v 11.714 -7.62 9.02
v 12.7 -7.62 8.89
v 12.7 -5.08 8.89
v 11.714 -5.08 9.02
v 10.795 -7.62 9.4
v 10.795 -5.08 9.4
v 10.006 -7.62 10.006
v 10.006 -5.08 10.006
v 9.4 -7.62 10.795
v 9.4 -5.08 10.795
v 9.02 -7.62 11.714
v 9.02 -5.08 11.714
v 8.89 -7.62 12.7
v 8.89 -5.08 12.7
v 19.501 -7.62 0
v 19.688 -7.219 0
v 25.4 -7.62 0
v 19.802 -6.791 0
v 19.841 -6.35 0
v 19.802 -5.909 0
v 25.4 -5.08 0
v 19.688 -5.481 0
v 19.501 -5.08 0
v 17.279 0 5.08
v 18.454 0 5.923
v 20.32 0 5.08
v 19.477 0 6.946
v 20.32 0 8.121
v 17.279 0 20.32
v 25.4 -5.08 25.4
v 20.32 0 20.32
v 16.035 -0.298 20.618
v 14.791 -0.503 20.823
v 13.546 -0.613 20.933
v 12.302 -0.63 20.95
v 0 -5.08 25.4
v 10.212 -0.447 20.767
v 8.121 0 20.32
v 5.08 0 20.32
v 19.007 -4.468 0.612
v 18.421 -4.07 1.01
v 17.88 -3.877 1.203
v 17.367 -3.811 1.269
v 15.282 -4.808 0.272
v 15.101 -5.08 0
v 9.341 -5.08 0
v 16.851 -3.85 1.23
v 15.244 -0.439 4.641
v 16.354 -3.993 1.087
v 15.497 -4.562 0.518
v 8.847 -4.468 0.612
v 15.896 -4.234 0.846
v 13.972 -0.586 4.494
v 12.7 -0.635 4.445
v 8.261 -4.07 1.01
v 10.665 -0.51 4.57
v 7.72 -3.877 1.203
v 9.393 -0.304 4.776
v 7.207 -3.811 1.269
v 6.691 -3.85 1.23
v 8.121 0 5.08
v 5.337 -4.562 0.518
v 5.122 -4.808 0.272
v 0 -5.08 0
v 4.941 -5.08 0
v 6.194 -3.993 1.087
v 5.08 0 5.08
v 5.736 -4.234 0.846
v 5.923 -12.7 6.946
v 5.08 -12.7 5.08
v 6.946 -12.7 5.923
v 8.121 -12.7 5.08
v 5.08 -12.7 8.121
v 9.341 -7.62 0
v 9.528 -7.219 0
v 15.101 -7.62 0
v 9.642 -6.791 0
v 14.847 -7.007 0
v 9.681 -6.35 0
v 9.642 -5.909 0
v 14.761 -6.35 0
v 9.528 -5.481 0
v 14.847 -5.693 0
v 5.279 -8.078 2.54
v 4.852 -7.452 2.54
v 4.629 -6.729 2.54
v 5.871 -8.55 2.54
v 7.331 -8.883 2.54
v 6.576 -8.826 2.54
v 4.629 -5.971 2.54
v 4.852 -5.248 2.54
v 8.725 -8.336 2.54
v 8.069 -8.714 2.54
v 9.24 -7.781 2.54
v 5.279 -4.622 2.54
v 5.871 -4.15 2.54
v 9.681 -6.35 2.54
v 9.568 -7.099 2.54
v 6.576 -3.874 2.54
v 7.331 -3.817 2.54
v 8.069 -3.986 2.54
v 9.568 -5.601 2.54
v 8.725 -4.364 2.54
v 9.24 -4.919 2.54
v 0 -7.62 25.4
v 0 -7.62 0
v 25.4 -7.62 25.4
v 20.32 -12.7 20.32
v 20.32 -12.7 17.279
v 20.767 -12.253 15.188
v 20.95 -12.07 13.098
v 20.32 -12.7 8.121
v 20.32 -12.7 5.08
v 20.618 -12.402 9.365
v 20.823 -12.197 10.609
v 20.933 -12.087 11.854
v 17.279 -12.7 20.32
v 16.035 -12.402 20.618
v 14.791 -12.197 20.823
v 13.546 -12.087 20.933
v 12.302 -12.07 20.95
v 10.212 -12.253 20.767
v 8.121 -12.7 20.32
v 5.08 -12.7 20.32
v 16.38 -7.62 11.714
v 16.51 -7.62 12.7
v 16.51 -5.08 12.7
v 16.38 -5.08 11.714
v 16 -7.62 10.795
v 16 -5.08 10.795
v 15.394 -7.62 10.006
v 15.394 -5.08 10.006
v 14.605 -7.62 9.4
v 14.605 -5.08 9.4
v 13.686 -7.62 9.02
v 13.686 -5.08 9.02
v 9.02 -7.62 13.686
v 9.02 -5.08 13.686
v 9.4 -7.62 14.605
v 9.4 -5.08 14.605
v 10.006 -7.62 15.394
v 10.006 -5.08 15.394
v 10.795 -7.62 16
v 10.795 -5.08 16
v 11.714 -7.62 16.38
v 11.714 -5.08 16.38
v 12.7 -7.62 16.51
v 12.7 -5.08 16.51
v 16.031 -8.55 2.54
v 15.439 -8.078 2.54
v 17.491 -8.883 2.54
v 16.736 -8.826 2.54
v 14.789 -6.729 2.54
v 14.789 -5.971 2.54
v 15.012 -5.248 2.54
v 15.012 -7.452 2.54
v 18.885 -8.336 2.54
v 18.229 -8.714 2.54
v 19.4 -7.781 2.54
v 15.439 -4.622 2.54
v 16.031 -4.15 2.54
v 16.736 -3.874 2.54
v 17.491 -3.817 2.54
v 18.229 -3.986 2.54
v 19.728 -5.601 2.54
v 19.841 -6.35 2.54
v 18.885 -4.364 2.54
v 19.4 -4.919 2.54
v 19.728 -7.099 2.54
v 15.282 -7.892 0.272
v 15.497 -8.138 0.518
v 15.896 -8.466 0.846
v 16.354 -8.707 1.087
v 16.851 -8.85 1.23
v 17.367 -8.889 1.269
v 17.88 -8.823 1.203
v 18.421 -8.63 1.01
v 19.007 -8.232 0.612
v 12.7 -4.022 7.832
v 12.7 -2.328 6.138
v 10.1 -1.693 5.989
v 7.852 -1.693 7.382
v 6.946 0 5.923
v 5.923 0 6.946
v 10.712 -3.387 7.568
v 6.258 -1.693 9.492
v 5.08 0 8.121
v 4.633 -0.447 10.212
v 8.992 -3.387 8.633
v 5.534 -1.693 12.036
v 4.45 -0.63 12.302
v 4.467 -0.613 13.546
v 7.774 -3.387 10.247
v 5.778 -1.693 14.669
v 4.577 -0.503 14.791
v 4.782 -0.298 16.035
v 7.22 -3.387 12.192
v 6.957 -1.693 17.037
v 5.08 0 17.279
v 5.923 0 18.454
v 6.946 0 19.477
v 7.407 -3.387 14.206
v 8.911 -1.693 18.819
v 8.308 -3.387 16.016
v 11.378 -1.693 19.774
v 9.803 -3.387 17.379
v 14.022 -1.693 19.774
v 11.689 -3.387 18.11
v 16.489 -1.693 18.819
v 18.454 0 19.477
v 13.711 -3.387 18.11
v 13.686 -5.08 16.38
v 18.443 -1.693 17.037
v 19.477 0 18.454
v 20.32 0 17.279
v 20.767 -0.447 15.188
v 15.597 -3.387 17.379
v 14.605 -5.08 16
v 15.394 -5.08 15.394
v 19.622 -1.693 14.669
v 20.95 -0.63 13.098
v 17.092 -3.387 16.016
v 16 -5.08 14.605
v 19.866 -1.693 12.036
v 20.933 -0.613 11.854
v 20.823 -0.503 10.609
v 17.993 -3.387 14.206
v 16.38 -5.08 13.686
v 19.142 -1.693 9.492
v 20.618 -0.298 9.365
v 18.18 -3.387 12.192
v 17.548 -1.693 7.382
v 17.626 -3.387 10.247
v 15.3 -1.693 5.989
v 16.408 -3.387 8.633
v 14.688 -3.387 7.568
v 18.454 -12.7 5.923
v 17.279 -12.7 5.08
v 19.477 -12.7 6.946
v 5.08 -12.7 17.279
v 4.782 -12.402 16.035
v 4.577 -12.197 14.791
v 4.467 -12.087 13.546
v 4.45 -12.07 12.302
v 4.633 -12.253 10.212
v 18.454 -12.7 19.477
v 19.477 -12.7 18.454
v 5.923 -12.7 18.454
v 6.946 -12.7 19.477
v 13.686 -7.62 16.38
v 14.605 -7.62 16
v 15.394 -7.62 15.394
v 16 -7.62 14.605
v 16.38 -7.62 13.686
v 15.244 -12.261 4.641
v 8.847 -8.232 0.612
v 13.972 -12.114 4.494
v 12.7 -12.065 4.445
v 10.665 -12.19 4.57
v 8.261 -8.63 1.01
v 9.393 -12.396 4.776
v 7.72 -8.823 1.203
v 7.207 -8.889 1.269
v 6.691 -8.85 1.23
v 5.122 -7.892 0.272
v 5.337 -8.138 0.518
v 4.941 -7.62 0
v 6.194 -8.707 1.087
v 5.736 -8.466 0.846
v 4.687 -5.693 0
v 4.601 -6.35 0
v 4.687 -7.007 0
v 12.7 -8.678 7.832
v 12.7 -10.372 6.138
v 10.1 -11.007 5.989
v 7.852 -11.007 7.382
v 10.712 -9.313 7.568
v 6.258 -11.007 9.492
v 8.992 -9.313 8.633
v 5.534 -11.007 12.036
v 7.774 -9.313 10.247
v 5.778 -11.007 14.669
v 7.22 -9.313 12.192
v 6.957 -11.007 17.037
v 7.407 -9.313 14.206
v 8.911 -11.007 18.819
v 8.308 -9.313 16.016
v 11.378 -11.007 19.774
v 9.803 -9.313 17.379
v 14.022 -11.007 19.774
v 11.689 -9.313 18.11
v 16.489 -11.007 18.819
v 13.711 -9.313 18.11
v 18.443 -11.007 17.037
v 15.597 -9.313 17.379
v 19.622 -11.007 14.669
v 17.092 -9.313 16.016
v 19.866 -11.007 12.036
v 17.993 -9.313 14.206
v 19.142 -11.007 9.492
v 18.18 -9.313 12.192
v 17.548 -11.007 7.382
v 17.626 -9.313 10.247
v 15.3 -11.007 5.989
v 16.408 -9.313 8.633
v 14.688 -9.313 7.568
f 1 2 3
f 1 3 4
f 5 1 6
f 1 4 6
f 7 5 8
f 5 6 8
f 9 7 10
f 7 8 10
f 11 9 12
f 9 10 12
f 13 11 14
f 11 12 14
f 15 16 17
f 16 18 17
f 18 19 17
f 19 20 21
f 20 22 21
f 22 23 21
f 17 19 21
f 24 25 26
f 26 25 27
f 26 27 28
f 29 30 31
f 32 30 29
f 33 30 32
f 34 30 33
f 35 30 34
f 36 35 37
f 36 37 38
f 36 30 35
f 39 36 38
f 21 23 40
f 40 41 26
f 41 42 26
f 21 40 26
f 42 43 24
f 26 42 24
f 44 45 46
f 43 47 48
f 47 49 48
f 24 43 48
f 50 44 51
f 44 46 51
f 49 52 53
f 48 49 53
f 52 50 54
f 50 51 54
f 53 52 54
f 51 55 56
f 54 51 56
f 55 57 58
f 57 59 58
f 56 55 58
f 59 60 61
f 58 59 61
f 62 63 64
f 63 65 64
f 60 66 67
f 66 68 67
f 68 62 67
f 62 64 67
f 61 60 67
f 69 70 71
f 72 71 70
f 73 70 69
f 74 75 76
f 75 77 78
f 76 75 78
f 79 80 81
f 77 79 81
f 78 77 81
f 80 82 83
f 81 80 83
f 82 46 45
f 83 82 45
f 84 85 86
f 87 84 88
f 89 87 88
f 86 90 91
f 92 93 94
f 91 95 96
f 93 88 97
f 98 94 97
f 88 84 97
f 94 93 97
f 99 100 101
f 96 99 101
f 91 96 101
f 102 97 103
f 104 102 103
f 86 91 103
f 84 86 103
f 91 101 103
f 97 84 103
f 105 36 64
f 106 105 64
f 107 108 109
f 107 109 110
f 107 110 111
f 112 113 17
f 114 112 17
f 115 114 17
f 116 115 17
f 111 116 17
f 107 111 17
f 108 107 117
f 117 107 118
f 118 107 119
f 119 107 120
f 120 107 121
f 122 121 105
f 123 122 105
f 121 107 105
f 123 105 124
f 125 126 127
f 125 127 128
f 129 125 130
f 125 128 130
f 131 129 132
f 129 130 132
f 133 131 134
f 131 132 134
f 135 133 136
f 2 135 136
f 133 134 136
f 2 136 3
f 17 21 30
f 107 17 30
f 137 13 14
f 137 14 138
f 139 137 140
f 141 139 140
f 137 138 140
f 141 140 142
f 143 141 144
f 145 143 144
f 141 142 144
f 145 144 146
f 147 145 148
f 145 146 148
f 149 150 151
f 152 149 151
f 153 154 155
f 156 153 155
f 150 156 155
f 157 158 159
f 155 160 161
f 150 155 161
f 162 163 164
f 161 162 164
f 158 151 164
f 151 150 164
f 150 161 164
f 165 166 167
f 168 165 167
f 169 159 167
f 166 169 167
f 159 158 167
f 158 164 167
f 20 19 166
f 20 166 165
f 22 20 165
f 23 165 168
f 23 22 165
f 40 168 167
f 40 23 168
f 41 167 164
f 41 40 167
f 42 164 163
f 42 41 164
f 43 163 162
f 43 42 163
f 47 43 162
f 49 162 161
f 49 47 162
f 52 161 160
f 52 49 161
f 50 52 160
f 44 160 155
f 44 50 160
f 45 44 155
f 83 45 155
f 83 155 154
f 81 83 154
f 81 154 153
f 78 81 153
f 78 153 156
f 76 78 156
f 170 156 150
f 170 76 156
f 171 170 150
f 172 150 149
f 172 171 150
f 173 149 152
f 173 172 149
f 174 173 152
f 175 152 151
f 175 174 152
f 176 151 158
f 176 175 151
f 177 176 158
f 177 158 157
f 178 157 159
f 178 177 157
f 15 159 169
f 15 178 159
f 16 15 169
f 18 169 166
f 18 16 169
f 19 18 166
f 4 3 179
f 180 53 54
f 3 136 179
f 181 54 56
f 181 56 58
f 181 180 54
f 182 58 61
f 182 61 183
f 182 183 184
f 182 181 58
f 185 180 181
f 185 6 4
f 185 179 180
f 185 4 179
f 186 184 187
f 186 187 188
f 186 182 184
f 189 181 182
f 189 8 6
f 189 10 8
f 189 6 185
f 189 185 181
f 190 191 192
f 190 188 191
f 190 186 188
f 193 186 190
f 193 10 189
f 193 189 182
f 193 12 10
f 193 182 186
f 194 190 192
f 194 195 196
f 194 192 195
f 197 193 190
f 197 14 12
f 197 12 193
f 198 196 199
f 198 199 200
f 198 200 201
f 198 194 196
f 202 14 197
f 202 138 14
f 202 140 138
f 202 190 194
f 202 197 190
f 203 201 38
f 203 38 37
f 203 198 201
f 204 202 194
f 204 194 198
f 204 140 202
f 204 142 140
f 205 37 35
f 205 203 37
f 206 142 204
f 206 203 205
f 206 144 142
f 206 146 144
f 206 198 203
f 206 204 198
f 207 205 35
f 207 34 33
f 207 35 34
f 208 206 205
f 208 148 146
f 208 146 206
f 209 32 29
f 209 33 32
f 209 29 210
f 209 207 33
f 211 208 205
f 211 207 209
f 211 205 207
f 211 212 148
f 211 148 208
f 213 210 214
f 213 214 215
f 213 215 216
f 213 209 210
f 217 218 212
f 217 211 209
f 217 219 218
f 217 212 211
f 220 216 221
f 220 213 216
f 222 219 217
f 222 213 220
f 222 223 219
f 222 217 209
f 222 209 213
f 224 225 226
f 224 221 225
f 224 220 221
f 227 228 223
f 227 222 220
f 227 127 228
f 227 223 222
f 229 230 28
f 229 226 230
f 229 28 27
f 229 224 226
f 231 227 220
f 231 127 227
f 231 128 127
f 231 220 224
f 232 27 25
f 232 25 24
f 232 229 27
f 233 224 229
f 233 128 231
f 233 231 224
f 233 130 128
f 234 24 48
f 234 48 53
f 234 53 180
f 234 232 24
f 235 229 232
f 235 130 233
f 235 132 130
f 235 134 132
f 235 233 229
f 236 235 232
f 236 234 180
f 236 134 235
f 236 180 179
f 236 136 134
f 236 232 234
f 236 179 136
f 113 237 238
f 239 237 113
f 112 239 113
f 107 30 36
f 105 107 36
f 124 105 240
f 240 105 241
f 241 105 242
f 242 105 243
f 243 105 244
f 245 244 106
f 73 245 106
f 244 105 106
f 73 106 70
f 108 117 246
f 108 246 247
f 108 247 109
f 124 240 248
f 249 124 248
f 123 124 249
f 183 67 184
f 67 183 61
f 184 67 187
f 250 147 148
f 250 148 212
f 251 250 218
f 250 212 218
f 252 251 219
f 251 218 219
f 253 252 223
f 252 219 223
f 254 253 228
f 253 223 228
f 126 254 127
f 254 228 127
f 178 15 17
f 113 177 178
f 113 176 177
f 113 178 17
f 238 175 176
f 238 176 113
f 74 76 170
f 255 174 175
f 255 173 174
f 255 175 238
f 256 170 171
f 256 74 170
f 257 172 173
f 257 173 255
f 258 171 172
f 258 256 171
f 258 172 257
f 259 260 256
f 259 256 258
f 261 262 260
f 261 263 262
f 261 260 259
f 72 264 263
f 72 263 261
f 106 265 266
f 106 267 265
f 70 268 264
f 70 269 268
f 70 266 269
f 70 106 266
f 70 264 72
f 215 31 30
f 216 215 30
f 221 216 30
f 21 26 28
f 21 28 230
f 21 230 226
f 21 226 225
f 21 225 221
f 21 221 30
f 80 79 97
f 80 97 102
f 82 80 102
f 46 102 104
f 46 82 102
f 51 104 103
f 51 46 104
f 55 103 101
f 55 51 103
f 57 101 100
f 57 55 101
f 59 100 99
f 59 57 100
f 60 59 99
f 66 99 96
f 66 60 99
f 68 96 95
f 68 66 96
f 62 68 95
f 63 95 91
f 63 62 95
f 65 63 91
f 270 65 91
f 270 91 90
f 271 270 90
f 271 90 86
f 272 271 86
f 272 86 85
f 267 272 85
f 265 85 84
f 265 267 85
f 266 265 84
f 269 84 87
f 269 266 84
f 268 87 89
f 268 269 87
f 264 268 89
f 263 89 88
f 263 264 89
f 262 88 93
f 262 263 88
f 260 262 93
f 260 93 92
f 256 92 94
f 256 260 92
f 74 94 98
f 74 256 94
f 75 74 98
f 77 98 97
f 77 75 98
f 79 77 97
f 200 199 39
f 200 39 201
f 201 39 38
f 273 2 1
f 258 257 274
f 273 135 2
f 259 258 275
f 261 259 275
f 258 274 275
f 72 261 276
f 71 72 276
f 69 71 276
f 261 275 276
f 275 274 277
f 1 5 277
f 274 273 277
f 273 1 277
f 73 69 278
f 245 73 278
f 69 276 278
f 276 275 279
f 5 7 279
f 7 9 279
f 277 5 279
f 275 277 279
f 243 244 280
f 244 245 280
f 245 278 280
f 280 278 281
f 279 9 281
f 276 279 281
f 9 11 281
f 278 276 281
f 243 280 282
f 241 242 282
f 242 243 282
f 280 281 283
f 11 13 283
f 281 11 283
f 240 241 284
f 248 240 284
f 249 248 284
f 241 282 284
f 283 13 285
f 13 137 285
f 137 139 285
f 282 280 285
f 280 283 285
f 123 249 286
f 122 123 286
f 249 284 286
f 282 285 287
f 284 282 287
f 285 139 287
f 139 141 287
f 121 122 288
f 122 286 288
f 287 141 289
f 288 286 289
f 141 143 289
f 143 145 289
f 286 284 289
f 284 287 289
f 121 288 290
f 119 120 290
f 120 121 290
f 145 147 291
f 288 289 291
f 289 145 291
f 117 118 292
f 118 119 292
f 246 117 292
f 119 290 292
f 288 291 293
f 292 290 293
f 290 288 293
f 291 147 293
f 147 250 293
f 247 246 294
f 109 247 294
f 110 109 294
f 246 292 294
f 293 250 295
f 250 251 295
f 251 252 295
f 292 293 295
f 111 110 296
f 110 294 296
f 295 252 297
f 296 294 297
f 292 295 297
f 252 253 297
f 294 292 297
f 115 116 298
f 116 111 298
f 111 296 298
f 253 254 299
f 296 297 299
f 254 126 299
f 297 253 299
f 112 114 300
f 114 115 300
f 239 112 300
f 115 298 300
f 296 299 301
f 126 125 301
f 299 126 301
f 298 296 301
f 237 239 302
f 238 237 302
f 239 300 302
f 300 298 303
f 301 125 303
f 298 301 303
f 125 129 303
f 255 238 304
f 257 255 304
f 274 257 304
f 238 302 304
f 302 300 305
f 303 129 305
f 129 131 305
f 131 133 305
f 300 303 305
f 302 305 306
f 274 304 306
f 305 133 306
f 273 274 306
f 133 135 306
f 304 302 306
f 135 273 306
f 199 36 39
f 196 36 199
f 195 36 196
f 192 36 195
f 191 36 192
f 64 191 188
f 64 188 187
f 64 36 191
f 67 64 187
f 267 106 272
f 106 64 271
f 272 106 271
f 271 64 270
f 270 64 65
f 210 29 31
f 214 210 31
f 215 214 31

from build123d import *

# Parameters (mm, degrees)
F1_DEPTH    = 12.7
F2_R        = 2.54
F3_DEPTH    = 2.54
F4_T1_DEPTH = 51.5282991577
F4_T3_DEPTH = 51.5282991577


# Not quite as in the source:
# - a fillet or chamfer that OpenCascade refuses, or shapes differently, is made with other operations: its cross-section is extruded or revolved along the edge and cut away or added


with BuildPart() as f1:
    # F0 (on Front) → F1 (new body)
    with BuildSketch(Plane.XZ):
        with BuildLine():
            Line((0, 25.4), (0, 12.7))
            Line((0, 12.7), (8.89, 12.7))
            ThreePointArc((8.89, 12.7), (10.0059231637, 15.3940768363), (12.7, 16.51))
            Line((12.7, 16.51), (12.7, 25.4))
            Line((12.7, 25.4), (0, 25.4))
        make_face()
        with BuildLine():
            Line((16.51, 12.7), (25.4, 12.7))
            Line((25.4, 12.7), (25.4, 25.4))
            Line((25.4, 25.4), (12.7, 25.4))
            Line((12.7, 25.4), (12.7, 16.51))
            ThreePointArc((12.7, 16.51), (15.3940768363, 15.3940768363), (16.51, 12.7))
        make_face()
        with BuildLine():
            Line((12.7, 8.89), (12.7, 0))
            Line((12.7, 0), (25.4, 0))
            Line((25.4, 0), (25.4, 12.7))
            Line((25.4, 12.7), (16.51, 12.7))
            ThreePointArc((16.51, 12.7), (15.3940768363, 10.0059231637), (12.7, 8.89))
        make_face()
        with BuildLine():
            Line((0, 12.7), (0, 0))
            Line((0, 0), (12.7, 0))
            Line((12.7, 0), (12.7, 8.89))
            ThreePointArc((12.7, 8.89), (10.0059231637, 10.0059231637), (8.89, 12.7))
            Line((8.89, 12.7), (0, 12.7))
        make_face()
    extrude(amount=F1_DEPTH)

    # F2 (on Top) → F3 (cut)
    with BuildSketch(Plane.XY):
        with Locations((7.1409146445, -6.35)):
            Circle(F2_R)
        with Locations((17.3009146445, -6.35)):
            Circle(F2_R)
    extrude(amount=F3_DEPTH, mode=Mode.SUBTRACT)

    # F4: chamfer of 5.08 on 10 edges, made by hand

    # F4_s2 → F4_t1 (cut)
    with BuildSketch(Plane.XY.offset(-13.0641495789)):
        Polygon((0, -7.62), (5.08, -12.7), (0, -12.7), align=None)
        Polygon((20.32, -12.7), (25.4, -7.62), (25.4, -12.7), align=None)
        Polygon((0, -5.08), (5.08, 0), (0, 0), align=None)
        Polygon((20.32, 0), (25.4, -5.08), (25.4, 0), align=None)
    extrude(amount=F4_T1_DEPTH, mode=Mode.SUBTRACT)

    # F4_s4 → F4_t3 (cut)
    with BuildSketch(Plane.YZ.offset(-13.0641495789)):
        Polygon((-7.62, 0), (-12.7, 5.08), (-12.7, 0), align=None)
        Polygon((-7.62, 25.4), (-12.7, 20.32), (-12.7, 25.4), align=None)
        Polygon((-5.08, 0), (0, 5.08), (0, 0), align=None)
        Polygon((-5.08, 25.4), (0, 20.32), (0, 25.4), align=None)
    extrude(amount=F4_T3_DEPTH, mode=Mode.SUBTRACT)

    # F4_s5 → F4_t6 (revolve, cut)
    with BuildSketch(Plane.YZ.offset(12.7)):
        Polygon((-12.7, 3.81), (-7.62, 8.89), (-12.7, 8.89), align=None)
    revolve(axis=Axis((12.7, -12.7, 12.7), (0, 1, 0)), mode=Mode.SUBTRACT)

    # F4_s7 → F4_t8 (revolve, cut)
    with BuildSketch(Plane.YZ.offset(12.7)):
        Polygon((0, 3.81), (-5.08, 8.89), (0, 8.89), align=None)
    revolve(axis=Axis((12.7, 0, 12.7), (0, 1, 0)), mode=Mode.SUBTRACT)


solid = f1.part
